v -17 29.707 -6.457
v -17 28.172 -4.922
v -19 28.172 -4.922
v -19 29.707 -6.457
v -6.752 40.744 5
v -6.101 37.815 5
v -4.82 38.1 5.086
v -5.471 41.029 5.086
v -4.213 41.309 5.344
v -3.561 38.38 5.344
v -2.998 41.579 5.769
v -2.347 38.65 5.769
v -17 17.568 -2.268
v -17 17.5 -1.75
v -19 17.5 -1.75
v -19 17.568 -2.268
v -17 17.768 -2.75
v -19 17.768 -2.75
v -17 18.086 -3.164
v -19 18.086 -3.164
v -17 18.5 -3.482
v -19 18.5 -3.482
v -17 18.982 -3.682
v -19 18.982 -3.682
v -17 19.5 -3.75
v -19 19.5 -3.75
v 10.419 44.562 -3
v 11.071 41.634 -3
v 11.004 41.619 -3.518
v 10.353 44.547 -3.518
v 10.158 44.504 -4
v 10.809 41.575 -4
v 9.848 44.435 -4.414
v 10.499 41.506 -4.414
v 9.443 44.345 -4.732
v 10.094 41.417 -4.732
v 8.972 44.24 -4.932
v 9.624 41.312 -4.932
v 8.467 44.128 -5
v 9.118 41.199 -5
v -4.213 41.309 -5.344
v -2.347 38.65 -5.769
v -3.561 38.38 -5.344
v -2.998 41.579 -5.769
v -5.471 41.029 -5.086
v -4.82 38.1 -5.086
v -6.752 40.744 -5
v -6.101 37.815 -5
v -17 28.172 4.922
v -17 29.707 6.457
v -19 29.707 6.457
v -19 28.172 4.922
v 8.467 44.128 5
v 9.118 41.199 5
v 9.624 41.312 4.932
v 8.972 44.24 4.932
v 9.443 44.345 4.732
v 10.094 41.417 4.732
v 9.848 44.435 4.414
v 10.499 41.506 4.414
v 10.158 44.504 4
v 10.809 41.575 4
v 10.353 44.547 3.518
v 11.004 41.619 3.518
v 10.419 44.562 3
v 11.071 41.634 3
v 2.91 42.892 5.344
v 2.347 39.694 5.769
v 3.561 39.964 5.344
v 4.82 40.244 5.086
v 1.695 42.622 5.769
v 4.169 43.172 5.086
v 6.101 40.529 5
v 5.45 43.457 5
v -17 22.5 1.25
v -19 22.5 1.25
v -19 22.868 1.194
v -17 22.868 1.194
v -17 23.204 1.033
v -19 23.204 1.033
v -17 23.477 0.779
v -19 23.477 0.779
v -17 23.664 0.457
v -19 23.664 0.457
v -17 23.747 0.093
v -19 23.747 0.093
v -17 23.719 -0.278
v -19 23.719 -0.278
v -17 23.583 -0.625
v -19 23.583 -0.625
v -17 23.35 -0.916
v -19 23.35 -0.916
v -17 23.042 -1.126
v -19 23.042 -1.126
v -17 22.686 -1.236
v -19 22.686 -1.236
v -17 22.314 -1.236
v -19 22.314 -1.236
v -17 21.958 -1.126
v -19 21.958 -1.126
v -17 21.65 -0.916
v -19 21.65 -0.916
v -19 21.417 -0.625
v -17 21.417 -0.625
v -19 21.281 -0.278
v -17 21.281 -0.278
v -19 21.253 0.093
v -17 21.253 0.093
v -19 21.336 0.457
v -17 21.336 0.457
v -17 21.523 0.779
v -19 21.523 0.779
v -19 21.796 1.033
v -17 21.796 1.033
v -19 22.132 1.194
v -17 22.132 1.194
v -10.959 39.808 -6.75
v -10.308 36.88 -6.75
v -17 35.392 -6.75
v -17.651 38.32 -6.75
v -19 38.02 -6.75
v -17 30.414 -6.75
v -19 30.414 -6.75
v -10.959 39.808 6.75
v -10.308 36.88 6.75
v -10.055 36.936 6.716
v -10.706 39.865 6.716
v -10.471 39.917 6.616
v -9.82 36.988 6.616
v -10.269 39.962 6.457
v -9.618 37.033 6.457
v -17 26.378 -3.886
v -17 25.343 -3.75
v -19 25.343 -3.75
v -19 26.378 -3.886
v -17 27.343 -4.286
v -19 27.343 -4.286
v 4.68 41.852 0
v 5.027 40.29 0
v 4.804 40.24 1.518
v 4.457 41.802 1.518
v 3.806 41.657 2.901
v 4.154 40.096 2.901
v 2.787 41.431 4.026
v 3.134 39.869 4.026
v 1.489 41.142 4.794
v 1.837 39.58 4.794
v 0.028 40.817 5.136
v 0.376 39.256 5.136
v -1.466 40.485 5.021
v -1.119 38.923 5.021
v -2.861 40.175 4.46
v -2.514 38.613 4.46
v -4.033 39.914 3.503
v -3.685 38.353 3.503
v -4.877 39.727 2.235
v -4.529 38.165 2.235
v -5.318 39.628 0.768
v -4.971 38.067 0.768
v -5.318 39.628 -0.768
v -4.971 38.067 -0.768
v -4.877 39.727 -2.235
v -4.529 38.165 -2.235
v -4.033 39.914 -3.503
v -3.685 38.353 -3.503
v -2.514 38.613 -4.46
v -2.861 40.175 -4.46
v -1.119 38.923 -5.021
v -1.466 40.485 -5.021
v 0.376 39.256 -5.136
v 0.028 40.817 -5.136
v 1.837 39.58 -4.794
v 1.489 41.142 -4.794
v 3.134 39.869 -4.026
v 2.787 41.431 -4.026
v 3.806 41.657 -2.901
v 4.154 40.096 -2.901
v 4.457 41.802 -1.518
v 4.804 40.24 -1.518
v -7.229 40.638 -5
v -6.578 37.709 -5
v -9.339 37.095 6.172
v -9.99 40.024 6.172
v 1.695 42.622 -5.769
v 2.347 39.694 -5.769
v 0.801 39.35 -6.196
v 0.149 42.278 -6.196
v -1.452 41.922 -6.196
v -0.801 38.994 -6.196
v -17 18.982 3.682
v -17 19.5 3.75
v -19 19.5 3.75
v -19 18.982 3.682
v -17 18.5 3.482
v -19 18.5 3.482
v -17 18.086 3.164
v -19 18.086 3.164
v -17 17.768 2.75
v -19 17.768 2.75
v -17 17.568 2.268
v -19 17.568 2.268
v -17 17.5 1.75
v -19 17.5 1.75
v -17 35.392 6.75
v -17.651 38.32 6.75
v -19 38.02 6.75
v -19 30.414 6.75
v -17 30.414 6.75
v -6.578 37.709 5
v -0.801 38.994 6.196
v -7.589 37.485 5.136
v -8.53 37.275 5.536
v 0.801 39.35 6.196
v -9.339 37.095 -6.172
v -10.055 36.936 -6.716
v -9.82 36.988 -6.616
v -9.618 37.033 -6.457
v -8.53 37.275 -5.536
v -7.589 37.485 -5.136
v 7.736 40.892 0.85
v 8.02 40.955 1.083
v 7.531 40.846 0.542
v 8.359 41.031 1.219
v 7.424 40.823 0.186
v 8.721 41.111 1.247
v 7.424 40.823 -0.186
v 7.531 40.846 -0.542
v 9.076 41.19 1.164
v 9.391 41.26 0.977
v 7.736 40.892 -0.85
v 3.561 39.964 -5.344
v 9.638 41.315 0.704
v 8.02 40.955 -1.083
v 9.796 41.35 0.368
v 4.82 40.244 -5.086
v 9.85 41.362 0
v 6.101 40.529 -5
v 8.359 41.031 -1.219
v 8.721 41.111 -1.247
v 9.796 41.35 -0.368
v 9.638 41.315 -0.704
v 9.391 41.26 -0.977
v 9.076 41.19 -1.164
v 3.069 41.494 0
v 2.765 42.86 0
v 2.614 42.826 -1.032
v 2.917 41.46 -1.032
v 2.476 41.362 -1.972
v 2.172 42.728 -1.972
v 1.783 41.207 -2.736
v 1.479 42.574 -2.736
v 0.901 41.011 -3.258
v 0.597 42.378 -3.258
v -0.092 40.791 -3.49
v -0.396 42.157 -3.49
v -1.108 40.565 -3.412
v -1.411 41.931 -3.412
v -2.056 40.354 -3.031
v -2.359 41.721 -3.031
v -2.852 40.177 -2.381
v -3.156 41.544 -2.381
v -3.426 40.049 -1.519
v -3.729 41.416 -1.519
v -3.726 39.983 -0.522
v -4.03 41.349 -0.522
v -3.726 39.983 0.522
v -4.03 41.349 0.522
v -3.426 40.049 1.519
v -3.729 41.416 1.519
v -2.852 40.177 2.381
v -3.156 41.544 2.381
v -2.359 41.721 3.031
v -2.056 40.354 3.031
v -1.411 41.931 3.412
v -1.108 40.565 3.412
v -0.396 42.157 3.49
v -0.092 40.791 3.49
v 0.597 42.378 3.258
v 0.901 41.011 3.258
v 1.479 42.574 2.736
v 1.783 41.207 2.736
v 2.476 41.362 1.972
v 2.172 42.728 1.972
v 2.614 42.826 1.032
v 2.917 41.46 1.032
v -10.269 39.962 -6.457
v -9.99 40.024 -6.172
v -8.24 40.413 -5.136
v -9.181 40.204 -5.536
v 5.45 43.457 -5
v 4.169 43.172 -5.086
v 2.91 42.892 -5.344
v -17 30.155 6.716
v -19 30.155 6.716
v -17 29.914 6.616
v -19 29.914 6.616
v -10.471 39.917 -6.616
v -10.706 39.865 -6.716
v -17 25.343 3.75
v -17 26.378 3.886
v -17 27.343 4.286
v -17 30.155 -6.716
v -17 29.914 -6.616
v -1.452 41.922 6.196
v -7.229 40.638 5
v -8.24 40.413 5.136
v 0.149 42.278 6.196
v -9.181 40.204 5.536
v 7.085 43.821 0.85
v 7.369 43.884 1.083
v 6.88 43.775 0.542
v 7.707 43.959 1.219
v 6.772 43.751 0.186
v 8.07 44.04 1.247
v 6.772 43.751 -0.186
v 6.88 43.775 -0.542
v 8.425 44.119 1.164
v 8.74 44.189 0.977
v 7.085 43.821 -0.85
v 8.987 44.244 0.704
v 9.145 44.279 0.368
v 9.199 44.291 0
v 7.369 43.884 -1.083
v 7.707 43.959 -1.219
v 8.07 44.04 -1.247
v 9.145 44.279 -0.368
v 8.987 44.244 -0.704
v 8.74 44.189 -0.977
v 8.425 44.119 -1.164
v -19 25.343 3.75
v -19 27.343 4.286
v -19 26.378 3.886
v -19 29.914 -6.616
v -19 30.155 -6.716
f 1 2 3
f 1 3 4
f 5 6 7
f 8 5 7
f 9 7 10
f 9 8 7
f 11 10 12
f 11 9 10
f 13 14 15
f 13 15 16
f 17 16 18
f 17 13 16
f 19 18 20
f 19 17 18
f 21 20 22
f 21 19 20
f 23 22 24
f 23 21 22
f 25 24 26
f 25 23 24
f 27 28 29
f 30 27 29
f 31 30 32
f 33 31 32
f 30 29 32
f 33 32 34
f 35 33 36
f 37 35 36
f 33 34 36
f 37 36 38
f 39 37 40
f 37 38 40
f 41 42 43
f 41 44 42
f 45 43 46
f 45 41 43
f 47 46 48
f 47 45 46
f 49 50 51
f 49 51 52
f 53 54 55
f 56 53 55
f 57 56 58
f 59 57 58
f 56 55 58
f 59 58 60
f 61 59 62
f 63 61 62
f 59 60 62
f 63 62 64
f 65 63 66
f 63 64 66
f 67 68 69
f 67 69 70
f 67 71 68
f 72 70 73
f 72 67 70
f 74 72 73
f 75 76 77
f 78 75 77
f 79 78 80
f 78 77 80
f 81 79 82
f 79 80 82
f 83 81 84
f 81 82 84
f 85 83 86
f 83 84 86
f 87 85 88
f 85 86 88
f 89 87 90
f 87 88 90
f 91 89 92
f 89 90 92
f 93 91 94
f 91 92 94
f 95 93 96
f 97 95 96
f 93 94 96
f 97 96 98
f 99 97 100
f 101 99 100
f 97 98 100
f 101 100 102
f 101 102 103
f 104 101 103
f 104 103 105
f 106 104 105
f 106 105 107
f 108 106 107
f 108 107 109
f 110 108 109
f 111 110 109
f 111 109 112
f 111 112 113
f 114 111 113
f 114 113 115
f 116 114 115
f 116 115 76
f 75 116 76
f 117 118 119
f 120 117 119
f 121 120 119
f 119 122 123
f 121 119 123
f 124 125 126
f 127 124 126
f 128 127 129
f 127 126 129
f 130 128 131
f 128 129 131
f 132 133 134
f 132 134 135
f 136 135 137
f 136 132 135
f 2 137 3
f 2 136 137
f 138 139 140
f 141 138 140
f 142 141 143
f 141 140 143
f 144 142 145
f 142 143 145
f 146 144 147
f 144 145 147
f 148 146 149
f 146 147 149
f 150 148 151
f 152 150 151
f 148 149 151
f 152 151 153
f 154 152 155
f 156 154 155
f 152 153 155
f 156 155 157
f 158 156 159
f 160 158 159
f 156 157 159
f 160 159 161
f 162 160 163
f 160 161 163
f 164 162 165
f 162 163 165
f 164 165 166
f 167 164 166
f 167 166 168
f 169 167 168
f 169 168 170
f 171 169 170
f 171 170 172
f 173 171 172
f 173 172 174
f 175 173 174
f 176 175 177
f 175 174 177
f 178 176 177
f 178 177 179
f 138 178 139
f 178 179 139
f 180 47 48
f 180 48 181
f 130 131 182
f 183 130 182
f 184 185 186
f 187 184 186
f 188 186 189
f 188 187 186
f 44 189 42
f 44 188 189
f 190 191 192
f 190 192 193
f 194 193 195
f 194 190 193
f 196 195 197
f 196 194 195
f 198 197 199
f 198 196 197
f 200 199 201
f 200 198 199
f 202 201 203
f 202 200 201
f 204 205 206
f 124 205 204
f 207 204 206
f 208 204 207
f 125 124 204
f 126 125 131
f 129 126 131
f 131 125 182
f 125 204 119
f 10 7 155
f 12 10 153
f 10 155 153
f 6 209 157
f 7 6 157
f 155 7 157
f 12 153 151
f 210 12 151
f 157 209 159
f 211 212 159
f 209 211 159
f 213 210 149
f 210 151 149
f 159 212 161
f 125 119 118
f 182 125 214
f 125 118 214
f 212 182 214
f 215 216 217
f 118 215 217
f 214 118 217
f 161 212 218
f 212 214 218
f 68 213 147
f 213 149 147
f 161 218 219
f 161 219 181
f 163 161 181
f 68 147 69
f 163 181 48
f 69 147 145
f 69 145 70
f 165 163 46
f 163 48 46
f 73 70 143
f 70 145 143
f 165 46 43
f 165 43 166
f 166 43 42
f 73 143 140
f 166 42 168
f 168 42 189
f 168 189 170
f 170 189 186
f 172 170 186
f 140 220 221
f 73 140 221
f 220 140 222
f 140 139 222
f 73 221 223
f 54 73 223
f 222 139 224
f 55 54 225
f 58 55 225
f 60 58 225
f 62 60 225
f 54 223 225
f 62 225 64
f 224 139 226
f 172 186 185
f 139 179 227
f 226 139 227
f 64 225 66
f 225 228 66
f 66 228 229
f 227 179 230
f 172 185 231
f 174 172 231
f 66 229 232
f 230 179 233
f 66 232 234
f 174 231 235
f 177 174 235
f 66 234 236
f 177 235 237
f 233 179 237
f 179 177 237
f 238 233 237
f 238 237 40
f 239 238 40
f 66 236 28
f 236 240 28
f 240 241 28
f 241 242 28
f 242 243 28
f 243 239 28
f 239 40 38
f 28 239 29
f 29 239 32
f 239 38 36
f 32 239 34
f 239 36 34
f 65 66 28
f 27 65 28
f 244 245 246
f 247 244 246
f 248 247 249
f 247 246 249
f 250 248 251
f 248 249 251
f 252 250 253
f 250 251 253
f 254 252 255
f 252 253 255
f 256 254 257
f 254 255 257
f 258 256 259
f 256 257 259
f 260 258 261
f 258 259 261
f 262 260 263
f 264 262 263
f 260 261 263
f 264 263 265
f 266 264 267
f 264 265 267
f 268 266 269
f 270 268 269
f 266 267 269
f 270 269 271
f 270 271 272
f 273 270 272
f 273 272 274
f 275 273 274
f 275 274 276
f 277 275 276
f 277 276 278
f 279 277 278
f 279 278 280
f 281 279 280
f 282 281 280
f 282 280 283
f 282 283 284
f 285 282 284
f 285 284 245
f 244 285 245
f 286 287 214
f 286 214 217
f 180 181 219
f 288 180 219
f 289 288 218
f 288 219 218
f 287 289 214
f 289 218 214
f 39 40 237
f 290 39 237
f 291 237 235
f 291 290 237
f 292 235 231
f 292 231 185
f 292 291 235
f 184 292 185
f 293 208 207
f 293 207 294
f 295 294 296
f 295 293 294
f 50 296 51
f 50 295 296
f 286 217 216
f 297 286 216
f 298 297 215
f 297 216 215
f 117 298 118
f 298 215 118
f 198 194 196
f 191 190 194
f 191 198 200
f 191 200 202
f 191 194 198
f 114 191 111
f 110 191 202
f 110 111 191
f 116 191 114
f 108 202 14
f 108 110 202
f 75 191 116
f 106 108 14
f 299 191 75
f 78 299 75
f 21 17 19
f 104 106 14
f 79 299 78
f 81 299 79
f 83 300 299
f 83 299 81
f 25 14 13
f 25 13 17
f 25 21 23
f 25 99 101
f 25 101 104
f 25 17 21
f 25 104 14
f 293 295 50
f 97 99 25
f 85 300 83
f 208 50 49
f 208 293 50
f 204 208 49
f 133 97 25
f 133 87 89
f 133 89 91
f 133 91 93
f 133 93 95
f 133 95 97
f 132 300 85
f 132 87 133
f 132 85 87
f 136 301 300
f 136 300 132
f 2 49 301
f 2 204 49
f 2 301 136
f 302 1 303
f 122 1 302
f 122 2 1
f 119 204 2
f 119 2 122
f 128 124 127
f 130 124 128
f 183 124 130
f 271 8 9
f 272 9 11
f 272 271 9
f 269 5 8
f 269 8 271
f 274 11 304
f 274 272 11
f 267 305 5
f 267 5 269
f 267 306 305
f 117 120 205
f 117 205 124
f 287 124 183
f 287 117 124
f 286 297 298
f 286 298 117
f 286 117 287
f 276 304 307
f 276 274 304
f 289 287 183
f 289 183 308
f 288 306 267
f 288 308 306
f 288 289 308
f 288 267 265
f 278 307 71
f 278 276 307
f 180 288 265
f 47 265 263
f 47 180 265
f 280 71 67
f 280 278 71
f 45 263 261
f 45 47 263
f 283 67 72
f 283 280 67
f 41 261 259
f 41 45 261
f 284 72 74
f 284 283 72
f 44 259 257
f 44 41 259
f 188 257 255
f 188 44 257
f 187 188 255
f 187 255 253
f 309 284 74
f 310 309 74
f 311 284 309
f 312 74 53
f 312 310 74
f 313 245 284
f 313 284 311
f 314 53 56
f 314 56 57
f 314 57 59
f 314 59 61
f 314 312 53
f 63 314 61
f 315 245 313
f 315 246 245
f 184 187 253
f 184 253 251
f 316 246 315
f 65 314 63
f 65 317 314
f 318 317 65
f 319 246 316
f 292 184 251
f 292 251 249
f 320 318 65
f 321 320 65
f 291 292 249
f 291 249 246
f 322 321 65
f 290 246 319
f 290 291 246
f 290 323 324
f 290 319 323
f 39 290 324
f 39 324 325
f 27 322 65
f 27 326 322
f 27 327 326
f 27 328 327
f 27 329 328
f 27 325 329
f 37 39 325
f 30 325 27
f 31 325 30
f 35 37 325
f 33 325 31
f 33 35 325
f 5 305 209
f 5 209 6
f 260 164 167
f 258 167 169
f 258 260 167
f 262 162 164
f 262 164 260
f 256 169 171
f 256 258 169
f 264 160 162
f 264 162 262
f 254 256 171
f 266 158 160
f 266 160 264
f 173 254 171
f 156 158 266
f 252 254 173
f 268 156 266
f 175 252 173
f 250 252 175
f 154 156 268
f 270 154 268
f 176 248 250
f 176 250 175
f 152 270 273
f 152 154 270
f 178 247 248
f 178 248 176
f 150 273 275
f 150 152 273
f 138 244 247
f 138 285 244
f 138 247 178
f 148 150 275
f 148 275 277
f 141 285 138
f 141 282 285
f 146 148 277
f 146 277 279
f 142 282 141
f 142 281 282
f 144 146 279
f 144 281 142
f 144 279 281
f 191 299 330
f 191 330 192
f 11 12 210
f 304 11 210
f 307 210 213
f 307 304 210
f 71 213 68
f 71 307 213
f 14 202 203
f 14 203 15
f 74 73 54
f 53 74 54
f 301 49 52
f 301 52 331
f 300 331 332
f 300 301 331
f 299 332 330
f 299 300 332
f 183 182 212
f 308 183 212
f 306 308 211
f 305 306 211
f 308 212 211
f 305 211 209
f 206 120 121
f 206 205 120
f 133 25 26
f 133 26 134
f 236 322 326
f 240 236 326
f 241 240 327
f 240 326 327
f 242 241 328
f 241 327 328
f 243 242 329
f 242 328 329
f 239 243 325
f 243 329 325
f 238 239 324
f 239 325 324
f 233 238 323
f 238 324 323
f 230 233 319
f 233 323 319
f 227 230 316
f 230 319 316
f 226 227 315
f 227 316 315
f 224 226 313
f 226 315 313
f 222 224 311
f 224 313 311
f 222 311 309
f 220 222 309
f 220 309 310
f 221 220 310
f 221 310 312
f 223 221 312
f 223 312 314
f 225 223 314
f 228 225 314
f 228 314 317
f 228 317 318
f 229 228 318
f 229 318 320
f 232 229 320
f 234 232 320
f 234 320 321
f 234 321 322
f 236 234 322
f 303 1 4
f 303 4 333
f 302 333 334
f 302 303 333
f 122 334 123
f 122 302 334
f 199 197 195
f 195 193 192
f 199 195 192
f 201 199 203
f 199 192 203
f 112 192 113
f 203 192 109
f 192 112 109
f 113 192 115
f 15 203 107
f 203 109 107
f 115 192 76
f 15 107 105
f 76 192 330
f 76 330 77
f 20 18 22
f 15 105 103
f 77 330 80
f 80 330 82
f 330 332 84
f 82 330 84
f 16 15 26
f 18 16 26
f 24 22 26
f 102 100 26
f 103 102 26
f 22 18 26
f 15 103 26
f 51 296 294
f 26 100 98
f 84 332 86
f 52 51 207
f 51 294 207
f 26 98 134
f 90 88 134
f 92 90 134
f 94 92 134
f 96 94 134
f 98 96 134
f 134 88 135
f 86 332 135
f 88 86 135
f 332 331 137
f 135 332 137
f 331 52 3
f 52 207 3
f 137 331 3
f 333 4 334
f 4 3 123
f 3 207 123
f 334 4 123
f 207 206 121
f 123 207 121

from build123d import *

# Parameters (mm, degrees)
BOSS_EXTRUDE1_DEPTH     = 3
BOSS_EXTRUDE2_DEPTH     = 2
CUT_EXTRUDE1_DEPTH      = 7.75
CUT_EXTRUDE1_DEPTH_BACK = 7.75
SKETCH5_R               = 1.25
CUT_EXTRUDE2_DEPTH      = 31.070572477
SKETCH6_R               = 1.25
CUT_EXTRUDE3_DEPTH      = 27.558218913
SKETCH7_R               = 3.5
CUT_EXTRUDE4_DEPTH      = 27.558218913
SKETCH10_R              = 6.25
SKETCH10_R_2            = 3.5
BOSS_EXTRUDE3_DEPTH     = 3
SKETCH8_R               = 5.15
CUT_EXTRUDE5_DEPTH      = 1.6
FILLET1_R               = 10


with BuildPart() as part:
    # Sketch2 → Boss-Extrude1 (new body)
    with BuildSketch(Plane(origin=(-8.299779748, 37.326456989, 0), x_dir=(0.976159298, 0.21705535, 0), z_dir=(-0.21705535, 0.976159298, 0))):
        with BuildLine():
            Line((-4.14298056, 6.75), (-8.912705405, 6.75))
            Line((-8.912705405, 6.75), (-8.912705405, -6.75))
            Line((-8.912705405, -6.75), (-4.14298056, -6.75))
            Line((-4.14298056, -6.75), (-3.64298056, -6.75))
            Line((-3.64298056, -6.75), (-2.057194122, -6.75))
            ThreePointArc((-2.057194122, -6.75), (-1.67451069, -6.673879533), (-1.350087341, -6.457106781))
            Line((-1.350087341, -6.457106781), (-1.064553435, -6.171572875))
            ThreePointArc((-1.064553435, -6.171572875), (0.23313996, -5.30448187), (1.76387369, -5))
            Line((1.76387369, -5), (14.343433612, -5))
            Line((14.343433612, -5), (14.843433612, -5))
            Line((14.843433612, -5), (17.843433612, -5))
            ThreePointArc((17.843433612, -5), (19.257647174, -4.414213562), (19.843433612, -3))
            Line((19.843433612, -3), (19.843433612, 3))
            ThreePointArc((19.843433612, 3), (19.257647174, 4.414213562), (17.843433612, 5))
            Line((17.843433612, 5), (14.843433612, 5))
            Line((14.843433612, 5), (14.343433612, 5))
            Line((14.343433612, 5), (1.76387369, 5))
            ThreePointArc((1.76387369, 5), (0.23313996, 5.30448187), (-1.064553435, 6.171572875))
            Line((-1.064553435, 6.171572875), (-1.350087341, 6.457106781))
            ThreePointArc((-1.350087341, 6.457106781), (-1.67451069, 6.673879533), (-2.057194122, 6.75))
            Line((-2.057194122, 6.75), (-3.64298056, 6.75))
            Line((-3.64298056, 6.75), (-4.14298056, 6.75))
        make_face()
    extrude(amount=BOSS_EXTRUDE1_DEPTH)

    # Sketch3 → Boss-Extrude2 (add)
    with BuildSketch(Plane.ZY.offset(17)):
        with BuildLine():
            Line((-6.75, 35.391906601), (-6.75, 38.320384496))
            Line((-6.75, 38.320384496), (6.75, 38.320384496))
            Line((6.75, 38.320384496), (6.75, 35.391906601))
            Line((6.75, 35.391906601), (6.75, 30.414213562))
            ThreePointArc((6.75, 30.414213562), (6.673879533, 30.03153013), (6.457106781, 29.707106781))
            Line((6.457106781, 29.707106781), (4.921572875, 28.171572875))
            ThreePointArc((4.921572875, 28.171572875), (4.05448187, 26.87387948), (3.75, 25.343145751))
            Line((3.75, 25.343145751), (3.75, 20.3))
            Line((3.75, 20.3), (3.75, 19.8))
            Line((3.75, 19.8), (3.75, 19.5))
            ThreePointArc((3.75, 19.5), (3.164213562, 18.085786438), (1.75, 17.5))
            Line((1.75, 17.5), (-1.75, 17.5))
            ThreePointArc((-1.75, 17.5), (-3.164213562, 18.085786438), (-3.75, 19.5))
            Line((-3.75, 19.5), (-3.75, 19.8))
            Line((-3.75, 19.8), (-3.75, 20.3))
            Line((-3.75, 20.3), (-3.75, 25.343145751))
            ThreePointArc((-3.75, 25.343145751), (-4.05448187, 26.87387948), (-4.921572875, 28.171572875))
            Line((-4.921572875, 28.171572875), (-6.457106781, 29.707106781))
            ThreePointArc((-6.457106781, 29.707106781), (-6.673879533, 30.03153013), (-6.75, 30.414213562))
            Line((-6.75, 30.414213562), (-6.75, 35.391906601))
        make_face()
    extrude(amount=BOSS_EXTRUDE2_DEPTH)

    # Sketch4 → Cut-Extrude1 (cut, two sides)
    with BuildSketch(Plane.XY) as cut_extrude1_sk:
        Polygon((-17.651166049, 38.320384496), (-19, 38.02046252), (-19, 38.320384496), align=None)
    extrude(amount=CUT_EXTRUDE1_DEPTH, mode=Mode.SUBTRACT)
    extrude(cut_extrude1_sk.sketch, amount=-CUT_EXTRUDE1_DEPTH_BACK, mode=Mode.SUBTRACT)

    # Sketch5 → Cut-Extrude2 (cut, through all)
    with BuildSketch(Plane.ZY.offset(19)):
        with Locations((0, 22.5)):
            Circle(SKETCH5_R)
    extrude(amount=-CUT_EXTRUDE2_DEPTH, mode=Mode.SUBTRACT)

    # Sketch6 → Cut-Extrude3 (cut, through all)
    with BuildSketch(Plane(origin=(-8.950945797, 40.254934884, 0), x_dir=(0.976159298, 0.21705535, 0), z_dir=(-0.21705535, 0.976159298, 0))):
        with Locations((17.343433612, 0)):
            Circle(SKETCH6_R)
    extrude(amount=-CUT_EXTRUDE3_DEPTH, mode=Mode.SUBTRACT)

    # Sketch7 → Cut-Extrude4 (cut, through all)
    with BuildSketch(Plane(origin=(-8.950945797, 40.254934884, 0), x_dir=(0.976159298, 0.21705535, 0), z_dir=(-0.21705535, 0.976159298, 0))):
        with Locations((8.502484958, 0)):
            Circle(SKETCH7_R)
    extrude(amount=-CUT_EXTRUDE4_DEPTH, mode=Mode.SUBTRACT)

    # Sketch10 → Boss-Extrude3 (add)
    with BuildSketch(Plane(origin=(-8.950945797, 40.254934884, 0), x_dir=(0.976159298, 0.21705535, 0), z_dir=(-0.21705535, 0.976159298, 0))):
        with Locations((8.502484958, 0)):
            Circle(SKETCH10_R)
        with Locations((8.502484958, 0)):
            Circle(SKETCH10_R_2, mode=Mode.SUBTRACT)
    extrude(amount=-BOSS_EXTRUDE3_DEPTH)

    # Sketch8 → Cut-Extrude5 (cut)
    with BuildSketch(Plane(origin=(-8.299779748, 37.326456989, 0), x_dir=(0.976159298, 0.21705535, 0), z_dir=(0.21705535, -0.976159298, 0))):
        with Locations((8.502484958, 0)):
            Circle(SKETCH8_R)
    extrude(amount=-CUT_EXTRUDE5_DEPTH, mode=Mode.SUBTRACT)

    # Fillet1
    fillet1_edges = [part.edges().sort_by_distance(p)[0] for p in [
        (-3.986180392, 39.822248221, 5),
        (-3.986180392, 39.822248221, -5),
        (3.335014343, 41.450163343, 5),
        (3.335014343, 41.450163343, -5),
    ]]
    fillet(fillet1_edges, radius=FILLET1_R)


solid = part.part
